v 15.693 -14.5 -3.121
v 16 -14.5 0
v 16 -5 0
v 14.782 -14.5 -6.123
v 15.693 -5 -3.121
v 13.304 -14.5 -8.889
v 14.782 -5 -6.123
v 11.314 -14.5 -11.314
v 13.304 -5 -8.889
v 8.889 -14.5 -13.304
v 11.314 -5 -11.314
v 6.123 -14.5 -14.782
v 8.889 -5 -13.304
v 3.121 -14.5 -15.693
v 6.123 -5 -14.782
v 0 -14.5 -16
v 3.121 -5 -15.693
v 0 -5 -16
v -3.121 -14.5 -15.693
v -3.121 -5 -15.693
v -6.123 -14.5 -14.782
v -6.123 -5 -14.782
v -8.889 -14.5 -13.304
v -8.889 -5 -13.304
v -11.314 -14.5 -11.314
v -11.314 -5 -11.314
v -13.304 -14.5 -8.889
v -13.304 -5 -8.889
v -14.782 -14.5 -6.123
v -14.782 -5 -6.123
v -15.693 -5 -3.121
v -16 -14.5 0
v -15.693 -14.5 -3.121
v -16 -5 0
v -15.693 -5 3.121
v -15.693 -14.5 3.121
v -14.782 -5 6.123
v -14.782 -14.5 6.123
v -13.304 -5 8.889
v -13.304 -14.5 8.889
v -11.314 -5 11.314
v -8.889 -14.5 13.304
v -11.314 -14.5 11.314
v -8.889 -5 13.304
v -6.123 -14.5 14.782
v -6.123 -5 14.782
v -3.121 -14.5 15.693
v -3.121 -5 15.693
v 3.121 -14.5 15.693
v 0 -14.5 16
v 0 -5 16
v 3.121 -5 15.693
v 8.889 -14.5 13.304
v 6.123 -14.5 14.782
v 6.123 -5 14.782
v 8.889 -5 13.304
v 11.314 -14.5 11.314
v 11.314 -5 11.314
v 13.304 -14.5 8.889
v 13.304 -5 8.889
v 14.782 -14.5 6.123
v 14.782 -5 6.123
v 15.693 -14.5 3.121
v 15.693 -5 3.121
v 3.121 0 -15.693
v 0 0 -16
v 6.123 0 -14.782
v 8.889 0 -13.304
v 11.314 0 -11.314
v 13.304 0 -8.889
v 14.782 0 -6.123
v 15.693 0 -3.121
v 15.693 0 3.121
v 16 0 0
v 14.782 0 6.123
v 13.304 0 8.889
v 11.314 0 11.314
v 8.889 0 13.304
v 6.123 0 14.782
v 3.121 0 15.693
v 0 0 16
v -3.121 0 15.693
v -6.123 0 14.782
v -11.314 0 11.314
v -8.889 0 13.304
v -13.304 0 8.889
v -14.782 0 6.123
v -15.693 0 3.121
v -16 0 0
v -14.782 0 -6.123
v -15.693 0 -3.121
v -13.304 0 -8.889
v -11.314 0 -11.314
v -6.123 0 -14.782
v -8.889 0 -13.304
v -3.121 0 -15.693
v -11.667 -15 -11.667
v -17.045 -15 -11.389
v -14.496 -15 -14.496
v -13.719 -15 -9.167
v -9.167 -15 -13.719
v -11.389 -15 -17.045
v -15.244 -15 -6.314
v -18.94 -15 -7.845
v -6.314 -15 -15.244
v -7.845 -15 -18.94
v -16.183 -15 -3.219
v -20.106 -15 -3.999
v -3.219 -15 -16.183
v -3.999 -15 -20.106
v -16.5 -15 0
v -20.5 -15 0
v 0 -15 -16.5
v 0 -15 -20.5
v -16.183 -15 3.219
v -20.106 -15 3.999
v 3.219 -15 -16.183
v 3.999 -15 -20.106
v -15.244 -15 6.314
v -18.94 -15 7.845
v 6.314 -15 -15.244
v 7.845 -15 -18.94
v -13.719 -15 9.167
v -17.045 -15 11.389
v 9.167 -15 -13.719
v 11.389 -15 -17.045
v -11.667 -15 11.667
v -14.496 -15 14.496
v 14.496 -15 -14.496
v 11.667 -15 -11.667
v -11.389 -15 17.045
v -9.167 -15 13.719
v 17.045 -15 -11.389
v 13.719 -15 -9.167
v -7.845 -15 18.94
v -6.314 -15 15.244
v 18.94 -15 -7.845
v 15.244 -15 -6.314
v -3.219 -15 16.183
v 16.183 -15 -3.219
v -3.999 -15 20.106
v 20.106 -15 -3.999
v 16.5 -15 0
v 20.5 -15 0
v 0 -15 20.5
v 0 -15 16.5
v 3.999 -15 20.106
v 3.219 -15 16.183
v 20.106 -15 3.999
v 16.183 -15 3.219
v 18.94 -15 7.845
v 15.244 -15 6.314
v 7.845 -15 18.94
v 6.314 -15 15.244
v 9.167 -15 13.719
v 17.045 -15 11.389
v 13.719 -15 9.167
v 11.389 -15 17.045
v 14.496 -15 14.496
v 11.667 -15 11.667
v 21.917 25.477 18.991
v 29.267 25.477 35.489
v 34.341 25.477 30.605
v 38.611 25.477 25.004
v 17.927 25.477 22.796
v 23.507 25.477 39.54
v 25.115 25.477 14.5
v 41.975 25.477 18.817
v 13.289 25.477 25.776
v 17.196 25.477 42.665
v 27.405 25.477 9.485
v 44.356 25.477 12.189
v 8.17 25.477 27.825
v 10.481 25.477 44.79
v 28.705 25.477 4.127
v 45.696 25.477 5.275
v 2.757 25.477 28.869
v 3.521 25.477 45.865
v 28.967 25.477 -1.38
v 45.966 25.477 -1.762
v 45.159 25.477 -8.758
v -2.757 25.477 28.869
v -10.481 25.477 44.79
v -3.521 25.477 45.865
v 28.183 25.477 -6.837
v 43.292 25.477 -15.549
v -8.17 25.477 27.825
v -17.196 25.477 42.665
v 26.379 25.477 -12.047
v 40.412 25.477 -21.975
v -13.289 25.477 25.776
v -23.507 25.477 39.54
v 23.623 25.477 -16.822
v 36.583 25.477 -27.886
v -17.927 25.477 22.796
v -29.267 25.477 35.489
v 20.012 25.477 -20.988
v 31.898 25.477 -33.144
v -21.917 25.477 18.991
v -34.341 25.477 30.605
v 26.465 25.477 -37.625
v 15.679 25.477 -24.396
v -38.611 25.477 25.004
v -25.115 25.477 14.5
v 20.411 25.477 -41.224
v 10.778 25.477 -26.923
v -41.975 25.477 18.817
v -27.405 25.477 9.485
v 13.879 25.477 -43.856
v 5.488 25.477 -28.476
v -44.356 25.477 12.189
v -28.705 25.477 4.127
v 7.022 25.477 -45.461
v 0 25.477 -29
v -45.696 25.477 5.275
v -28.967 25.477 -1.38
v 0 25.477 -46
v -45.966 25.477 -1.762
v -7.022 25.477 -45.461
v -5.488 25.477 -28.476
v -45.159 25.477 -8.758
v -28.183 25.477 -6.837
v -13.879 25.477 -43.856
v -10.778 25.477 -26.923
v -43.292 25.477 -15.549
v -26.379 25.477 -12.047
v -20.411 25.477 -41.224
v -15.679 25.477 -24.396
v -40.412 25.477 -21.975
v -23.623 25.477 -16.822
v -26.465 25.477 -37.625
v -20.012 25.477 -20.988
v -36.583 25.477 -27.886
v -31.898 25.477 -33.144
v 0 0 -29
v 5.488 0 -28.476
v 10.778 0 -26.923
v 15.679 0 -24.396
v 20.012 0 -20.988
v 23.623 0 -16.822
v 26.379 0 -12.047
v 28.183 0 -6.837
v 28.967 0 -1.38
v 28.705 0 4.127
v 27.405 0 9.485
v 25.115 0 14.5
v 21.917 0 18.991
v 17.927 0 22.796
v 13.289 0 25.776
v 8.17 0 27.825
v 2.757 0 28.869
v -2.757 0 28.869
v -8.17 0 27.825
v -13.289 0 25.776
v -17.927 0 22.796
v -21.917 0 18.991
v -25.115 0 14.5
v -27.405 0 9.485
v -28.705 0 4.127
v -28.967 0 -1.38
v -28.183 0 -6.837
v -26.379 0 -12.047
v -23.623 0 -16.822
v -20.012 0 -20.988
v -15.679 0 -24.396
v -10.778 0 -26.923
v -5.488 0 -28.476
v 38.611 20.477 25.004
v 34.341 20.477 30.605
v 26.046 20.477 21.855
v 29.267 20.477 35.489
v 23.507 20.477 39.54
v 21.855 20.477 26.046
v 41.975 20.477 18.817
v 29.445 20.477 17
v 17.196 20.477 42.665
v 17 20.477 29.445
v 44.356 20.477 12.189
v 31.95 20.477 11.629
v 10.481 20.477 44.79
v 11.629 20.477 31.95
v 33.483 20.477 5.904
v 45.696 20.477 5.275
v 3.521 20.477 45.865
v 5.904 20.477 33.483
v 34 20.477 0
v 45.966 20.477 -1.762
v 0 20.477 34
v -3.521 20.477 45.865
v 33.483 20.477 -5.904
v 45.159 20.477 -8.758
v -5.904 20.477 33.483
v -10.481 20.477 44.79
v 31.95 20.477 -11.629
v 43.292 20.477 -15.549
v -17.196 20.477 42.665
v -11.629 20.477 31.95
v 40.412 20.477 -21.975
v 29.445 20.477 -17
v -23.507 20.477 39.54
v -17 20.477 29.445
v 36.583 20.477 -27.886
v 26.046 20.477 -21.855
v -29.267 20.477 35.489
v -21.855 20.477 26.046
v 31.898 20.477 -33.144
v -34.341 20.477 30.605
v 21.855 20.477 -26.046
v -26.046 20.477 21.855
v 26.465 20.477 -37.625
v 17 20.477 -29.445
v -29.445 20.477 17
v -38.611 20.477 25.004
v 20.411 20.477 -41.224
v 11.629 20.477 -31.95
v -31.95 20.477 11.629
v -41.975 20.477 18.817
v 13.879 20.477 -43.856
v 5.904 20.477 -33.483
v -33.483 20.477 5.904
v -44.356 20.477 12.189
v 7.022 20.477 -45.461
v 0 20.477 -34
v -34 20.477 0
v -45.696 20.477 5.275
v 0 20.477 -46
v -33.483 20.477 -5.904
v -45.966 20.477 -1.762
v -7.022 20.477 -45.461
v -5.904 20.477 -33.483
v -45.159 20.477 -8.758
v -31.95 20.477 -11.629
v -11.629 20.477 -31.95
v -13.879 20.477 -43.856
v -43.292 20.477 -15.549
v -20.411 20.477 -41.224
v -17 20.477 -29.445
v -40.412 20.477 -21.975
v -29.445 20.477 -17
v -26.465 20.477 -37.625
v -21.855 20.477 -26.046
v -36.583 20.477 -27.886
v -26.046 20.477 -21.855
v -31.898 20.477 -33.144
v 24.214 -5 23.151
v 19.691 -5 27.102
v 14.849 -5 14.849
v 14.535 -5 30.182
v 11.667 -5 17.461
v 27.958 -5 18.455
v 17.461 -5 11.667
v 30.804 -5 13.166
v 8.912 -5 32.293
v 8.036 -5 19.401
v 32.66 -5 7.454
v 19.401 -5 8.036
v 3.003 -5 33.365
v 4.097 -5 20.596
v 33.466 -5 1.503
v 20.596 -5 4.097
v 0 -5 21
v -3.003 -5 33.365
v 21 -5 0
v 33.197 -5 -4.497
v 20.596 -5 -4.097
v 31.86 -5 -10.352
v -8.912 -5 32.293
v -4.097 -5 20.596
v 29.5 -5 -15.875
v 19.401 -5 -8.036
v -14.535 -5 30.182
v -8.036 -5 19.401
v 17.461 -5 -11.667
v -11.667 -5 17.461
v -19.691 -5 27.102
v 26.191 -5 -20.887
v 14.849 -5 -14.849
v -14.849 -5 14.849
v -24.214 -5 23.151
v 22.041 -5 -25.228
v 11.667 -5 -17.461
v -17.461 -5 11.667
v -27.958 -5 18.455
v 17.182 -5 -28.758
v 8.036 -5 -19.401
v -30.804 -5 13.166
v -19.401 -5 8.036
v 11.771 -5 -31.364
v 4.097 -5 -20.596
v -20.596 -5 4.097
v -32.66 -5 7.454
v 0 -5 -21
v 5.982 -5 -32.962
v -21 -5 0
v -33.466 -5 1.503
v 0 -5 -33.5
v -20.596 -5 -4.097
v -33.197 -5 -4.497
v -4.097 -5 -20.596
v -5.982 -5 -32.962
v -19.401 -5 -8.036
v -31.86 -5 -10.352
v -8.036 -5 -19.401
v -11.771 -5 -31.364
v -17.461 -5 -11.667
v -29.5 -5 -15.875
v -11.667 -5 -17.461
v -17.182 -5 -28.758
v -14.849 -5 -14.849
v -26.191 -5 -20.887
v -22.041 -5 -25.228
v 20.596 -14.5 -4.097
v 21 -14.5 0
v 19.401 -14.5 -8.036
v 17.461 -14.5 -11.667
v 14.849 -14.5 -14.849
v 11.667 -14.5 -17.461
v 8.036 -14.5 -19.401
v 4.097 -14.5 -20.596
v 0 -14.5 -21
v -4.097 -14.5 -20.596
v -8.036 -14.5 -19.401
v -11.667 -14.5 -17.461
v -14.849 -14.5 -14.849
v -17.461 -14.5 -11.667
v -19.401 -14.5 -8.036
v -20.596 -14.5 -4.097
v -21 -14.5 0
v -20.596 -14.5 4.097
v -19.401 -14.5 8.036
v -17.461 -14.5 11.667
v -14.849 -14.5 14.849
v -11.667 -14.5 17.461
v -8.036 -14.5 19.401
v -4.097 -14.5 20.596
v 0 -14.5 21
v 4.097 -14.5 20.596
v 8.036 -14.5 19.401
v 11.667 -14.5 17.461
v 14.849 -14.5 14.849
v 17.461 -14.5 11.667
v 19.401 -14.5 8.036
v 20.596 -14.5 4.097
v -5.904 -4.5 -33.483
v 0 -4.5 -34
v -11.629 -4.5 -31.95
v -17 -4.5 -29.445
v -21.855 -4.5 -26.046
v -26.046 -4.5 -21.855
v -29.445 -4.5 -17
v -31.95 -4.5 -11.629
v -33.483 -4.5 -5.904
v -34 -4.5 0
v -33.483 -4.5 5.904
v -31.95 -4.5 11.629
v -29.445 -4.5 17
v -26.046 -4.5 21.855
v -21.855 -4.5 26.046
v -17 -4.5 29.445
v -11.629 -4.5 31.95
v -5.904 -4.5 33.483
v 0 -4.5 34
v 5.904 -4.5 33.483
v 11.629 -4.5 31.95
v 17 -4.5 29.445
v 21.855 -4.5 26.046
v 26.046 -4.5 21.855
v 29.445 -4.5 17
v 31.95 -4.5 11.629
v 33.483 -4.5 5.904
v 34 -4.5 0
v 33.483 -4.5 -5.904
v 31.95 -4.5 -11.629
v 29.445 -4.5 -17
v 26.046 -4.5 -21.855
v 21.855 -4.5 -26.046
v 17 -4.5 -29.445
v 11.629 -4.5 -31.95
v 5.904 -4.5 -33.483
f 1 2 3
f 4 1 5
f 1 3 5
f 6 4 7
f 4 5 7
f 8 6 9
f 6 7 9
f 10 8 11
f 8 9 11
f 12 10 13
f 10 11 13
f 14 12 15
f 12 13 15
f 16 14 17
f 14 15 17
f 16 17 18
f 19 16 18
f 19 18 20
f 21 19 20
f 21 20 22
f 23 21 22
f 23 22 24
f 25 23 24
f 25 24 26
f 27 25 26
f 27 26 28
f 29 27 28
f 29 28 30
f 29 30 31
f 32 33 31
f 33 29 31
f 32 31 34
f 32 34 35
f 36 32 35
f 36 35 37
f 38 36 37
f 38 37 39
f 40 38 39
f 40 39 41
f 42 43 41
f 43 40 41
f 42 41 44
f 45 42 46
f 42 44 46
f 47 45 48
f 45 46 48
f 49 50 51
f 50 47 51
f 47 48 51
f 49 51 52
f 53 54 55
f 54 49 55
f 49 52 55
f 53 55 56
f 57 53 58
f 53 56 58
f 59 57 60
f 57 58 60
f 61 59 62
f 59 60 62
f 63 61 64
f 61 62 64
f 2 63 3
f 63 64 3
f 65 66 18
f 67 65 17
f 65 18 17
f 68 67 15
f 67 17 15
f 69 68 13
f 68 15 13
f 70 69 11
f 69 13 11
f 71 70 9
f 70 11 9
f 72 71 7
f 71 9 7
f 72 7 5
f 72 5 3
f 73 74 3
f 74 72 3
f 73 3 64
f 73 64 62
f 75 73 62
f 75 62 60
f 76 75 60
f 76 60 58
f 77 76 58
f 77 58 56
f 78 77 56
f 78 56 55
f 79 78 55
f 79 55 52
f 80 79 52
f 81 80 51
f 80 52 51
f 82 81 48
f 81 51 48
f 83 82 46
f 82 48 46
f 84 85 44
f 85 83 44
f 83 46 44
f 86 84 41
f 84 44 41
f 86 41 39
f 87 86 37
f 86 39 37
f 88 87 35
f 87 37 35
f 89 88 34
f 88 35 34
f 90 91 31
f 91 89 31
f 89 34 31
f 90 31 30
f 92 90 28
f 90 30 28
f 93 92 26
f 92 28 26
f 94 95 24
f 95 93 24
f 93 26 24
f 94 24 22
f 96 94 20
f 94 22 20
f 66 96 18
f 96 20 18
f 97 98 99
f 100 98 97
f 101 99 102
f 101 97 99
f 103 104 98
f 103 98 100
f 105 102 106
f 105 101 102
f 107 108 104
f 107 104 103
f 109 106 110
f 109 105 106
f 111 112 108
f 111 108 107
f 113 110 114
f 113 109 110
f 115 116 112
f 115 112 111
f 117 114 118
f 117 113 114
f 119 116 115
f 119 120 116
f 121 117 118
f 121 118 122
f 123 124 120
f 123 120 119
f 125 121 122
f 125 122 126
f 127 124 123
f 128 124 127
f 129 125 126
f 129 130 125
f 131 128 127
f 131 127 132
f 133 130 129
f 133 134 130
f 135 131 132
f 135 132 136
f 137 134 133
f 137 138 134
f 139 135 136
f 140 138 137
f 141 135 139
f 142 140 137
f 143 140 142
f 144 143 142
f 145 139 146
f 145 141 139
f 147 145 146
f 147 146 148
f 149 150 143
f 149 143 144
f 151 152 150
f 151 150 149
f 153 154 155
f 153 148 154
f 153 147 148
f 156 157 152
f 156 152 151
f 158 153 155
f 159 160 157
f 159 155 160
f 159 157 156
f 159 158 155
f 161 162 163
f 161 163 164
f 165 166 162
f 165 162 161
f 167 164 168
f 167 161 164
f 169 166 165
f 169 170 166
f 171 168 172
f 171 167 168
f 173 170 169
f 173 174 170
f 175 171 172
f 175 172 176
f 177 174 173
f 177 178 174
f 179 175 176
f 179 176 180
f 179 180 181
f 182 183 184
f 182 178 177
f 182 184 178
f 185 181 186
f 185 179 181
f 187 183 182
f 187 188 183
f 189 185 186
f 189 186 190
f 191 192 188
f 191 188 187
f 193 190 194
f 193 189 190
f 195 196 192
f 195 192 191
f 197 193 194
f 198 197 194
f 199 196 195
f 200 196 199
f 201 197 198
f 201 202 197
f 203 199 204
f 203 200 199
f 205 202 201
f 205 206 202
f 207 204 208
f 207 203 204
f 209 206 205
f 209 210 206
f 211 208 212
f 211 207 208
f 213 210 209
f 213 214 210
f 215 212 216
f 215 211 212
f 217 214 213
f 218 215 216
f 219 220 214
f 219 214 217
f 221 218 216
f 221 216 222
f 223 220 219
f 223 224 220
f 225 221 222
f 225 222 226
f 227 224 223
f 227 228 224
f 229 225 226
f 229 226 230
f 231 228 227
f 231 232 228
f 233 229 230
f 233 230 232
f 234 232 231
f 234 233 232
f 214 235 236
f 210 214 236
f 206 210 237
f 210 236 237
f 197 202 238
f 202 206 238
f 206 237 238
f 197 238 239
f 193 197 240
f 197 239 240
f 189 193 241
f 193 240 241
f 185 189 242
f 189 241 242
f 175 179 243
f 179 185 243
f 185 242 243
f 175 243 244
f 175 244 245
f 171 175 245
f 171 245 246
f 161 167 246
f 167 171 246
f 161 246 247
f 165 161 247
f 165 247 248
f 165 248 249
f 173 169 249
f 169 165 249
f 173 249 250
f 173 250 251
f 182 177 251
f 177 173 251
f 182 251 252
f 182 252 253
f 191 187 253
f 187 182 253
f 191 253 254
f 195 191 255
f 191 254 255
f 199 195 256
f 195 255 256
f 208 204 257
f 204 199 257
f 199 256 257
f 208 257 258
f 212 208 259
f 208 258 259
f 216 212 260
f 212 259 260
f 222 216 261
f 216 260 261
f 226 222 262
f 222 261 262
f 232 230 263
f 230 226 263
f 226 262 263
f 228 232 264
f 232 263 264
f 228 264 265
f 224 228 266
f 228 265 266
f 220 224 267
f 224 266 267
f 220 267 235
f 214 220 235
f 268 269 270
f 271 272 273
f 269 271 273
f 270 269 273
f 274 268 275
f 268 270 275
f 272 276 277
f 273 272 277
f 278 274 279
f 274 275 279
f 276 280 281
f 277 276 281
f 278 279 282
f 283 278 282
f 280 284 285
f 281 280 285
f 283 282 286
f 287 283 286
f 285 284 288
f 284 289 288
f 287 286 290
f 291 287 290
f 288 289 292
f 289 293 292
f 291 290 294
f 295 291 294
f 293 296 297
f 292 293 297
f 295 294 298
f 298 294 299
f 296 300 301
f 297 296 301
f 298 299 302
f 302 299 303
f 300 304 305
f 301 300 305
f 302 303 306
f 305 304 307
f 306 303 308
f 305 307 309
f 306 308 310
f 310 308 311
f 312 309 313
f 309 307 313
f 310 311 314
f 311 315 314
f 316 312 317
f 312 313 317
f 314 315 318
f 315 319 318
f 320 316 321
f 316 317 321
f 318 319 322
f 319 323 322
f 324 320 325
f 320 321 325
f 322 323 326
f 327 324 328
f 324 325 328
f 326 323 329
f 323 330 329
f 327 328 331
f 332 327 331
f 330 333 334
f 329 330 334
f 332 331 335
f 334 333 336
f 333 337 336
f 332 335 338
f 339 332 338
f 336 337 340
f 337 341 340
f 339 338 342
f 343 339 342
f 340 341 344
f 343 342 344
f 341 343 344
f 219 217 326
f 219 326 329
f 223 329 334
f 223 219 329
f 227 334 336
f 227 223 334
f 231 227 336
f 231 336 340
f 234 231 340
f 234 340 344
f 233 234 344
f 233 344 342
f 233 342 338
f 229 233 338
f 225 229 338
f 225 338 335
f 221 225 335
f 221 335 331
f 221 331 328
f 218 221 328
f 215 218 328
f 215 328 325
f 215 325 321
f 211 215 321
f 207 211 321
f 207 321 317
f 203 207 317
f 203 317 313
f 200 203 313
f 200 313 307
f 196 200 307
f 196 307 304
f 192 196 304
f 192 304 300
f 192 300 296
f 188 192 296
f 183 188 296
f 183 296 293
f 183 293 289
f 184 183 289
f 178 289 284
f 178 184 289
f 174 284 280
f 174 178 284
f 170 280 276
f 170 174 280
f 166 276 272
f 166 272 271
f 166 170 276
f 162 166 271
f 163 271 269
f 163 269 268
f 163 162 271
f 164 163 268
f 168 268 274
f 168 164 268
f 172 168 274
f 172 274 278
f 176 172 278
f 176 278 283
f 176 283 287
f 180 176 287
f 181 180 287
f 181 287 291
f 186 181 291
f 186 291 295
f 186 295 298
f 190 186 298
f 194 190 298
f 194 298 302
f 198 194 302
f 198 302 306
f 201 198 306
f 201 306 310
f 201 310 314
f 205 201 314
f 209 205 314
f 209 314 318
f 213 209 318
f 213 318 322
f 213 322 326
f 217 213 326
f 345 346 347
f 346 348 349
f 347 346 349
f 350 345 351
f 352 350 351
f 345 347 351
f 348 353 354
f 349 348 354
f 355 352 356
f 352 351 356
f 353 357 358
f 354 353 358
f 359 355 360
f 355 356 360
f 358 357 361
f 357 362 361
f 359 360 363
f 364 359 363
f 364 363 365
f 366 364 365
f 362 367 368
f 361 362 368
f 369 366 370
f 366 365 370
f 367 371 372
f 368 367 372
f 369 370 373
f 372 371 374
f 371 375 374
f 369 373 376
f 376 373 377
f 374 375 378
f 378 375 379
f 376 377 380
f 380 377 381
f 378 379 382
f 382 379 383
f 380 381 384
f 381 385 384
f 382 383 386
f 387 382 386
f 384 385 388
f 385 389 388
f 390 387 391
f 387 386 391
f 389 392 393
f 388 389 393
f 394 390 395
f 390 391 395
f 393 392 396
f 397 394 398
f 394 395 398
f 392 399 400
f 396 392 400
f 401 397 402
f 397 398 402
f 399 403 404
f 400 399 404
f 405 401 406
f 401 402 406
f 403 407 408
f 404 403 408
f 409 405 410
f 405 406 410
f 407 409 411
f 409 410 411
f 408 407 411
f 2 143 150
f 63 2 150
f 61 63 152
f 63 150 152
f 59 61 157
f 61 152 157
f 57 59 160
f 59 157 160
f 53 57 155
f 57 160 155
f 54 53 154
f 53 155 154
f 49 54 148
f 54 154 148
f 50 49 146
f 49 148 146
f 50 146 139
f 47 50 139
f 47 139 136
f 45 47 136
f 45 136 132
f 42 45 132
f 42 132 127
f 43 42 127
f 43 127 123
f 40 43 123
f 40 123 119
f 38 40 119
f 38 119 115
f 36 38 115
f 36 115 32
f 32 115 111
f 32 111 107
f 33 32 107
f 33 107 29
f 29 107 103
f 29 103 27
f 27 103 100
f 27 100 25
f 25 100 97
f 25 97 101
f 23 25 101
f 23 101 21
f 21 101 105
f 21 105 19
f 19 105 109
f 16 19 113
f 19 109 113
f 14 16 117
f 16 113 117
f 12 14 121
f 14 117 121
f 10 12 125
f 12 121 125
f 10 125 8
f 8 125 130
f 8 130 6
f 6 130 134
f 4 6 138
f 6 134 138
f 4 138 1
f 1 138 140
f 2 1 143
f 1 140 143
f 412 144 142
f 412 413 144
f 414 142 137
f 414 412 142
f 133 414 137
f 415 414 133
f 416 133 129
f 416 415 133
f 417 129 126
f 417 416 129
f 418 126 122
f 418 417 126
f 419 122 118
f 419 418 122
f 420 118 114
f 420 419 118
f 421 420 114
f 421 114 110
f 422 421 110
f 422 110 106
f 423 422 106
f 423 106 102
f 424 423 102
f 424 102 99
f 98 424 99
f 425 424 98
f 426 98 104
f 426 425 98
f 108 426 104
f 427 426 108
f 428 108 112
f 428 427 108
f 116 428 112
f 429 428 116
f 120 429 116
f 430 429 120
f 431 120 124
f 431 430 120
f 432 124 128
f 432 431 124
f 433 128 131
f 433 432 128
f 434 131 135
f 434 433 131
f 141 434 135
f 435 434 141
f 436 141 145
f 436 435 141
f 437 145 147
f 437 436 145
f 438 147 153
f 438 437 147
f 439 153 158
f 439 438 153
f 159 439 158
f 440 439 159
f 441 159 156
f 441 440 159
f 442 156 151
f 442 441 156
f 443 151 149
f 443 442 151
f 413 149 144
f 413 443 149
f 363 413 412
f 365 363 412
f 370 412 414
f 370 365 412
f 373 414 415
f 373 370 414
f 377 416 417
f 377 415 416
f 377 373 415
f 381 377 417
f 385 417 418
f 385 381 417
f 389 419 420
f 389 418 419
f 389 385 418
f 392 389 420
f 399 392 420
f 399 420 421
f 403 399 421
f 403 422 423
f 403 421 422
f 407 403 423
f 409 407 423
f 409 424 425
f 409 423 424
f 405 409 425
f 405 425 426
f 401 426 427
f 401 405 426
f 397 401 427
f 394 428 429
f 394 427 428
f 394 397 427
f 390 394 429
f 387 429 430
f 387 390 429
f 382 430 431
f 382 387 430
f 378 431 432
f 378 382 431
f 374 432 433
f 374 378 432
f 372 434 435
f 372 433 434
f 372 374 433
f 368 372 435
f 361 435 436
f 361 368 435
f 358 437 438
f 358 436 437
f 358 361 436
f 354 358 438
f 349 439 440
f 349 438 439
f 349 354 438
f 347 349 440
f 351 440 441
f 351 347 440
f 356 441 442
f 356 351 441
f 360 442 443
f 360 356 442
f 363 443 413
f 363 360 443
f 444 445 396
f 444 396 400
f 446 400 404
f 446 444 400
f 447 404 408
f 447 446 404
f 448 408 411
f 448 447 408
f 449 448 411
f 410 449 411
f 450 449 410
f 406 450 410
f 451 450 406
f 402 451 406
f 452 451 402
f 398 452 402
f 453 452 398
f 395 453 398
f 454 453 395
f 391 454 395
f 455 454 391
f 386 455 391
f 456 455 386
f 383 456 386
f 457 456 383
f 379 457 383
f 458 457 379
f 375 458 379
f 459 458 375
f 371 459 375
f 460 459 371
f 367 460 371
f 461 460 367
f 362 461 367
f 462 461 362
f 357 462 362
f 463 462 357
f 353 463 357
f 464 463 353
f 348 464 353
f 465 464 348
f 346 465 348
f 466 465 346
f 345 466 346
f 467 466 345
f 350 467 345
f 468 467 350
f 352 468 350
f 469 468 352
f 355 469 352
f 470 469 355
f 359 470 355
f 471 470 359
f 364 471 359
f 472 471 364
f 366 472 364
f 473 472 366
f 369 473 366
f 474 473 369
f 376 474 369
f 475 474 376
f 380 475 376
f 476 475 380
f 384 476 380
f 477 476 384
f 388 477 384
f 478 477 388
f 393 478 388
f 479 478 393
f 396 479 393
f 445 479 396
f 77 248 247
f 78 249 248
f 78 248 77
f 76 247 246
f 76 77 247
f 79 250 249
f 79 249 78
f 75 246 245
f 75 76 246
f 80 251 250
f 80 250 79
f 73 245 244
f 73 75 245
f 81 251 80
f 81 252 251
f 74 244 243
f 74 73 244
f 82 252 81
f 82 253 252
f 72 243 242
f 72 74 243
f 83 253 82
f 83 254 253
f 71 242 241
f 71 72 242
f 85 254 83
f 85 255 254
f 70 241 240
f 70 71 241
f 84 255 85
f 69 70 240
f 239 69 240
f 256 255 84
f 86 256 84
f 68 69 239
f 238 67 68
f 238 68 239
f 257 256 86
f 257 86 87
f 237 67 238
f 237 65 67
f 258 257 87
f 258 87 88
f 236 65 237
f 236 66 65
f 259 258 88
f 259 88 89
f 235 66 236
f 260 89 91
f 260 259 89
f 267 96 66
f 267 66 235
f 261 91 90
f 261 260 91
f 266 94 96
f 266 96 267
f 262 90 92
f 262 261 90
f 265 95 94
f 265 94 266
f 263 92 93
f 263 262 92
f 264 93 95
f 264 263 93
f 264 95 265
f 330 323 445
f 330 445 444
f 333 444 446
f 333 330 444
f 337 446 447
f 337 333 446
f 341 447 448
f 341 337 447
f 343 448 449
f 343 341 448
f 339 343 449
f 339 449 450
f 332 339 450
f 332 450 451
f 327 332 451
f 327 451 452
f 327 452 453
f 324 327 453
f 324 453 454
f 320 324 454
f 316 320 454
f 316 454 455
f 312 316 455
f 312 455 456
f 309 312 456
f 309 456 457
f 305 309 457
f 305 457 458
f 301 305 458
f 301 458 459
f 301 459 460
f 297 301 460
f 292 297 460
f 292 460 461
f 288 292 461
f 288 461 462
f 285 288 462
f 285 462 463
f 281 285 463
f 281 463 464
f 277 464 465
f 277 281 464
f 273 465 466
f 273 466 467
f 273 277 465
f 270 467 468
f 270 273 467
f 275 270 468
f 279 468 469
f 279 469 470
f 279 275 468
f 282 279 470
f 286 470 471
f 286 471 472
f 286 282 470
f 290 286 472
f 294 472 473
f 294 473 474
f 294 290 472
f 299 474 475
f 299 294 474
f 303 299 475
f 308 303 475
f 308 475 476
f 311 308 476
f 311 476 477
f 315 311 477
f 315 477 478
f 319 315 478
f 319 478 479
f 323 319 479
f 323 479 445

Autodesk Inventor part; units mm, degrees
ref_plane "YZ Plane" through (0, 0, 0) normal (1, 0, 0) x (0, 1, 0)
ref_plane "XZ Plane" through (0, 0, 0) normal (0, 1, 0) x (-1, 0, 0)
ref_plane "XY Plane" through (0, 0, 0) normal (0, 0, 1) x (1, 0, 0)
sketch "Skizze1" plane through (0, 0, 0) normal (1, 0, 0) x (0, 1, 0)
  line L0 (0, -16) -> (-5, -16)
  line L1 (-5, -16) -> (-5, -34)
  line L2 (-5, -34) -> (0, -34)
  line L3 (0, -34) -> (0, -16)
  line L4 (-11.0954, 0) -> (31.5723, 0) projected
  line L5 (0, -55.2) -> (0, 9.2) projected
  line L6 (0, -34) -> (25.477, -34)
  line L7 (25.477, -34) -> (25.477, -29)
  line L8 (25.477, -29) -> (0, -29)
  line L9 (0, -29) -> (0, -34)
  line L10 (25.477, -34) -> (20.477, -34)
  line L11 (20.477, -34) -> (20.477, -46)
  line L12 (20.477, -46) -> (25.477, -46)
  line L13 (25.477, -46) -> (25.477, -34)
  point P0 (0, 0)
  point P1 (0, -29)
  dimension "d0" = 16
  dimension "d1" = 34
  dimension "d2" = 5
  dimension "d3" = 5
  dimension "d4" = 5
  dimension "d5" = 46
revolve "Umdrehung1" add sketch "Skizze1" angle 360 about axis through (0, -10, 0) along (0, 1, 0)
chamfer "Fase1" distance 0.5 angle 45 1 edges at (0, -5, 34)
sketch "Skizze2" plane through (0, -5, 0) normal (0, -1, 0) x (1, 0, 0)
  circle A0 centre (0, 0) radius 16
  circle A1 centre (0, 0) radius 21
  circle A2 centre (0, 0) radius 16 projected
  dimension "d10" = 5
  dimension "d11" = 0
extrude "Extrusion1" add sketch "Skizze2" along normal blind 10
chamfer "Fase2" distance 0.5 angle 45 2 edges at (-21, -15, 0) (-16, -15, 0)
equation "\"d3\" = d2"
equation "\"d4\" = d2"
properties part number "Topf"
